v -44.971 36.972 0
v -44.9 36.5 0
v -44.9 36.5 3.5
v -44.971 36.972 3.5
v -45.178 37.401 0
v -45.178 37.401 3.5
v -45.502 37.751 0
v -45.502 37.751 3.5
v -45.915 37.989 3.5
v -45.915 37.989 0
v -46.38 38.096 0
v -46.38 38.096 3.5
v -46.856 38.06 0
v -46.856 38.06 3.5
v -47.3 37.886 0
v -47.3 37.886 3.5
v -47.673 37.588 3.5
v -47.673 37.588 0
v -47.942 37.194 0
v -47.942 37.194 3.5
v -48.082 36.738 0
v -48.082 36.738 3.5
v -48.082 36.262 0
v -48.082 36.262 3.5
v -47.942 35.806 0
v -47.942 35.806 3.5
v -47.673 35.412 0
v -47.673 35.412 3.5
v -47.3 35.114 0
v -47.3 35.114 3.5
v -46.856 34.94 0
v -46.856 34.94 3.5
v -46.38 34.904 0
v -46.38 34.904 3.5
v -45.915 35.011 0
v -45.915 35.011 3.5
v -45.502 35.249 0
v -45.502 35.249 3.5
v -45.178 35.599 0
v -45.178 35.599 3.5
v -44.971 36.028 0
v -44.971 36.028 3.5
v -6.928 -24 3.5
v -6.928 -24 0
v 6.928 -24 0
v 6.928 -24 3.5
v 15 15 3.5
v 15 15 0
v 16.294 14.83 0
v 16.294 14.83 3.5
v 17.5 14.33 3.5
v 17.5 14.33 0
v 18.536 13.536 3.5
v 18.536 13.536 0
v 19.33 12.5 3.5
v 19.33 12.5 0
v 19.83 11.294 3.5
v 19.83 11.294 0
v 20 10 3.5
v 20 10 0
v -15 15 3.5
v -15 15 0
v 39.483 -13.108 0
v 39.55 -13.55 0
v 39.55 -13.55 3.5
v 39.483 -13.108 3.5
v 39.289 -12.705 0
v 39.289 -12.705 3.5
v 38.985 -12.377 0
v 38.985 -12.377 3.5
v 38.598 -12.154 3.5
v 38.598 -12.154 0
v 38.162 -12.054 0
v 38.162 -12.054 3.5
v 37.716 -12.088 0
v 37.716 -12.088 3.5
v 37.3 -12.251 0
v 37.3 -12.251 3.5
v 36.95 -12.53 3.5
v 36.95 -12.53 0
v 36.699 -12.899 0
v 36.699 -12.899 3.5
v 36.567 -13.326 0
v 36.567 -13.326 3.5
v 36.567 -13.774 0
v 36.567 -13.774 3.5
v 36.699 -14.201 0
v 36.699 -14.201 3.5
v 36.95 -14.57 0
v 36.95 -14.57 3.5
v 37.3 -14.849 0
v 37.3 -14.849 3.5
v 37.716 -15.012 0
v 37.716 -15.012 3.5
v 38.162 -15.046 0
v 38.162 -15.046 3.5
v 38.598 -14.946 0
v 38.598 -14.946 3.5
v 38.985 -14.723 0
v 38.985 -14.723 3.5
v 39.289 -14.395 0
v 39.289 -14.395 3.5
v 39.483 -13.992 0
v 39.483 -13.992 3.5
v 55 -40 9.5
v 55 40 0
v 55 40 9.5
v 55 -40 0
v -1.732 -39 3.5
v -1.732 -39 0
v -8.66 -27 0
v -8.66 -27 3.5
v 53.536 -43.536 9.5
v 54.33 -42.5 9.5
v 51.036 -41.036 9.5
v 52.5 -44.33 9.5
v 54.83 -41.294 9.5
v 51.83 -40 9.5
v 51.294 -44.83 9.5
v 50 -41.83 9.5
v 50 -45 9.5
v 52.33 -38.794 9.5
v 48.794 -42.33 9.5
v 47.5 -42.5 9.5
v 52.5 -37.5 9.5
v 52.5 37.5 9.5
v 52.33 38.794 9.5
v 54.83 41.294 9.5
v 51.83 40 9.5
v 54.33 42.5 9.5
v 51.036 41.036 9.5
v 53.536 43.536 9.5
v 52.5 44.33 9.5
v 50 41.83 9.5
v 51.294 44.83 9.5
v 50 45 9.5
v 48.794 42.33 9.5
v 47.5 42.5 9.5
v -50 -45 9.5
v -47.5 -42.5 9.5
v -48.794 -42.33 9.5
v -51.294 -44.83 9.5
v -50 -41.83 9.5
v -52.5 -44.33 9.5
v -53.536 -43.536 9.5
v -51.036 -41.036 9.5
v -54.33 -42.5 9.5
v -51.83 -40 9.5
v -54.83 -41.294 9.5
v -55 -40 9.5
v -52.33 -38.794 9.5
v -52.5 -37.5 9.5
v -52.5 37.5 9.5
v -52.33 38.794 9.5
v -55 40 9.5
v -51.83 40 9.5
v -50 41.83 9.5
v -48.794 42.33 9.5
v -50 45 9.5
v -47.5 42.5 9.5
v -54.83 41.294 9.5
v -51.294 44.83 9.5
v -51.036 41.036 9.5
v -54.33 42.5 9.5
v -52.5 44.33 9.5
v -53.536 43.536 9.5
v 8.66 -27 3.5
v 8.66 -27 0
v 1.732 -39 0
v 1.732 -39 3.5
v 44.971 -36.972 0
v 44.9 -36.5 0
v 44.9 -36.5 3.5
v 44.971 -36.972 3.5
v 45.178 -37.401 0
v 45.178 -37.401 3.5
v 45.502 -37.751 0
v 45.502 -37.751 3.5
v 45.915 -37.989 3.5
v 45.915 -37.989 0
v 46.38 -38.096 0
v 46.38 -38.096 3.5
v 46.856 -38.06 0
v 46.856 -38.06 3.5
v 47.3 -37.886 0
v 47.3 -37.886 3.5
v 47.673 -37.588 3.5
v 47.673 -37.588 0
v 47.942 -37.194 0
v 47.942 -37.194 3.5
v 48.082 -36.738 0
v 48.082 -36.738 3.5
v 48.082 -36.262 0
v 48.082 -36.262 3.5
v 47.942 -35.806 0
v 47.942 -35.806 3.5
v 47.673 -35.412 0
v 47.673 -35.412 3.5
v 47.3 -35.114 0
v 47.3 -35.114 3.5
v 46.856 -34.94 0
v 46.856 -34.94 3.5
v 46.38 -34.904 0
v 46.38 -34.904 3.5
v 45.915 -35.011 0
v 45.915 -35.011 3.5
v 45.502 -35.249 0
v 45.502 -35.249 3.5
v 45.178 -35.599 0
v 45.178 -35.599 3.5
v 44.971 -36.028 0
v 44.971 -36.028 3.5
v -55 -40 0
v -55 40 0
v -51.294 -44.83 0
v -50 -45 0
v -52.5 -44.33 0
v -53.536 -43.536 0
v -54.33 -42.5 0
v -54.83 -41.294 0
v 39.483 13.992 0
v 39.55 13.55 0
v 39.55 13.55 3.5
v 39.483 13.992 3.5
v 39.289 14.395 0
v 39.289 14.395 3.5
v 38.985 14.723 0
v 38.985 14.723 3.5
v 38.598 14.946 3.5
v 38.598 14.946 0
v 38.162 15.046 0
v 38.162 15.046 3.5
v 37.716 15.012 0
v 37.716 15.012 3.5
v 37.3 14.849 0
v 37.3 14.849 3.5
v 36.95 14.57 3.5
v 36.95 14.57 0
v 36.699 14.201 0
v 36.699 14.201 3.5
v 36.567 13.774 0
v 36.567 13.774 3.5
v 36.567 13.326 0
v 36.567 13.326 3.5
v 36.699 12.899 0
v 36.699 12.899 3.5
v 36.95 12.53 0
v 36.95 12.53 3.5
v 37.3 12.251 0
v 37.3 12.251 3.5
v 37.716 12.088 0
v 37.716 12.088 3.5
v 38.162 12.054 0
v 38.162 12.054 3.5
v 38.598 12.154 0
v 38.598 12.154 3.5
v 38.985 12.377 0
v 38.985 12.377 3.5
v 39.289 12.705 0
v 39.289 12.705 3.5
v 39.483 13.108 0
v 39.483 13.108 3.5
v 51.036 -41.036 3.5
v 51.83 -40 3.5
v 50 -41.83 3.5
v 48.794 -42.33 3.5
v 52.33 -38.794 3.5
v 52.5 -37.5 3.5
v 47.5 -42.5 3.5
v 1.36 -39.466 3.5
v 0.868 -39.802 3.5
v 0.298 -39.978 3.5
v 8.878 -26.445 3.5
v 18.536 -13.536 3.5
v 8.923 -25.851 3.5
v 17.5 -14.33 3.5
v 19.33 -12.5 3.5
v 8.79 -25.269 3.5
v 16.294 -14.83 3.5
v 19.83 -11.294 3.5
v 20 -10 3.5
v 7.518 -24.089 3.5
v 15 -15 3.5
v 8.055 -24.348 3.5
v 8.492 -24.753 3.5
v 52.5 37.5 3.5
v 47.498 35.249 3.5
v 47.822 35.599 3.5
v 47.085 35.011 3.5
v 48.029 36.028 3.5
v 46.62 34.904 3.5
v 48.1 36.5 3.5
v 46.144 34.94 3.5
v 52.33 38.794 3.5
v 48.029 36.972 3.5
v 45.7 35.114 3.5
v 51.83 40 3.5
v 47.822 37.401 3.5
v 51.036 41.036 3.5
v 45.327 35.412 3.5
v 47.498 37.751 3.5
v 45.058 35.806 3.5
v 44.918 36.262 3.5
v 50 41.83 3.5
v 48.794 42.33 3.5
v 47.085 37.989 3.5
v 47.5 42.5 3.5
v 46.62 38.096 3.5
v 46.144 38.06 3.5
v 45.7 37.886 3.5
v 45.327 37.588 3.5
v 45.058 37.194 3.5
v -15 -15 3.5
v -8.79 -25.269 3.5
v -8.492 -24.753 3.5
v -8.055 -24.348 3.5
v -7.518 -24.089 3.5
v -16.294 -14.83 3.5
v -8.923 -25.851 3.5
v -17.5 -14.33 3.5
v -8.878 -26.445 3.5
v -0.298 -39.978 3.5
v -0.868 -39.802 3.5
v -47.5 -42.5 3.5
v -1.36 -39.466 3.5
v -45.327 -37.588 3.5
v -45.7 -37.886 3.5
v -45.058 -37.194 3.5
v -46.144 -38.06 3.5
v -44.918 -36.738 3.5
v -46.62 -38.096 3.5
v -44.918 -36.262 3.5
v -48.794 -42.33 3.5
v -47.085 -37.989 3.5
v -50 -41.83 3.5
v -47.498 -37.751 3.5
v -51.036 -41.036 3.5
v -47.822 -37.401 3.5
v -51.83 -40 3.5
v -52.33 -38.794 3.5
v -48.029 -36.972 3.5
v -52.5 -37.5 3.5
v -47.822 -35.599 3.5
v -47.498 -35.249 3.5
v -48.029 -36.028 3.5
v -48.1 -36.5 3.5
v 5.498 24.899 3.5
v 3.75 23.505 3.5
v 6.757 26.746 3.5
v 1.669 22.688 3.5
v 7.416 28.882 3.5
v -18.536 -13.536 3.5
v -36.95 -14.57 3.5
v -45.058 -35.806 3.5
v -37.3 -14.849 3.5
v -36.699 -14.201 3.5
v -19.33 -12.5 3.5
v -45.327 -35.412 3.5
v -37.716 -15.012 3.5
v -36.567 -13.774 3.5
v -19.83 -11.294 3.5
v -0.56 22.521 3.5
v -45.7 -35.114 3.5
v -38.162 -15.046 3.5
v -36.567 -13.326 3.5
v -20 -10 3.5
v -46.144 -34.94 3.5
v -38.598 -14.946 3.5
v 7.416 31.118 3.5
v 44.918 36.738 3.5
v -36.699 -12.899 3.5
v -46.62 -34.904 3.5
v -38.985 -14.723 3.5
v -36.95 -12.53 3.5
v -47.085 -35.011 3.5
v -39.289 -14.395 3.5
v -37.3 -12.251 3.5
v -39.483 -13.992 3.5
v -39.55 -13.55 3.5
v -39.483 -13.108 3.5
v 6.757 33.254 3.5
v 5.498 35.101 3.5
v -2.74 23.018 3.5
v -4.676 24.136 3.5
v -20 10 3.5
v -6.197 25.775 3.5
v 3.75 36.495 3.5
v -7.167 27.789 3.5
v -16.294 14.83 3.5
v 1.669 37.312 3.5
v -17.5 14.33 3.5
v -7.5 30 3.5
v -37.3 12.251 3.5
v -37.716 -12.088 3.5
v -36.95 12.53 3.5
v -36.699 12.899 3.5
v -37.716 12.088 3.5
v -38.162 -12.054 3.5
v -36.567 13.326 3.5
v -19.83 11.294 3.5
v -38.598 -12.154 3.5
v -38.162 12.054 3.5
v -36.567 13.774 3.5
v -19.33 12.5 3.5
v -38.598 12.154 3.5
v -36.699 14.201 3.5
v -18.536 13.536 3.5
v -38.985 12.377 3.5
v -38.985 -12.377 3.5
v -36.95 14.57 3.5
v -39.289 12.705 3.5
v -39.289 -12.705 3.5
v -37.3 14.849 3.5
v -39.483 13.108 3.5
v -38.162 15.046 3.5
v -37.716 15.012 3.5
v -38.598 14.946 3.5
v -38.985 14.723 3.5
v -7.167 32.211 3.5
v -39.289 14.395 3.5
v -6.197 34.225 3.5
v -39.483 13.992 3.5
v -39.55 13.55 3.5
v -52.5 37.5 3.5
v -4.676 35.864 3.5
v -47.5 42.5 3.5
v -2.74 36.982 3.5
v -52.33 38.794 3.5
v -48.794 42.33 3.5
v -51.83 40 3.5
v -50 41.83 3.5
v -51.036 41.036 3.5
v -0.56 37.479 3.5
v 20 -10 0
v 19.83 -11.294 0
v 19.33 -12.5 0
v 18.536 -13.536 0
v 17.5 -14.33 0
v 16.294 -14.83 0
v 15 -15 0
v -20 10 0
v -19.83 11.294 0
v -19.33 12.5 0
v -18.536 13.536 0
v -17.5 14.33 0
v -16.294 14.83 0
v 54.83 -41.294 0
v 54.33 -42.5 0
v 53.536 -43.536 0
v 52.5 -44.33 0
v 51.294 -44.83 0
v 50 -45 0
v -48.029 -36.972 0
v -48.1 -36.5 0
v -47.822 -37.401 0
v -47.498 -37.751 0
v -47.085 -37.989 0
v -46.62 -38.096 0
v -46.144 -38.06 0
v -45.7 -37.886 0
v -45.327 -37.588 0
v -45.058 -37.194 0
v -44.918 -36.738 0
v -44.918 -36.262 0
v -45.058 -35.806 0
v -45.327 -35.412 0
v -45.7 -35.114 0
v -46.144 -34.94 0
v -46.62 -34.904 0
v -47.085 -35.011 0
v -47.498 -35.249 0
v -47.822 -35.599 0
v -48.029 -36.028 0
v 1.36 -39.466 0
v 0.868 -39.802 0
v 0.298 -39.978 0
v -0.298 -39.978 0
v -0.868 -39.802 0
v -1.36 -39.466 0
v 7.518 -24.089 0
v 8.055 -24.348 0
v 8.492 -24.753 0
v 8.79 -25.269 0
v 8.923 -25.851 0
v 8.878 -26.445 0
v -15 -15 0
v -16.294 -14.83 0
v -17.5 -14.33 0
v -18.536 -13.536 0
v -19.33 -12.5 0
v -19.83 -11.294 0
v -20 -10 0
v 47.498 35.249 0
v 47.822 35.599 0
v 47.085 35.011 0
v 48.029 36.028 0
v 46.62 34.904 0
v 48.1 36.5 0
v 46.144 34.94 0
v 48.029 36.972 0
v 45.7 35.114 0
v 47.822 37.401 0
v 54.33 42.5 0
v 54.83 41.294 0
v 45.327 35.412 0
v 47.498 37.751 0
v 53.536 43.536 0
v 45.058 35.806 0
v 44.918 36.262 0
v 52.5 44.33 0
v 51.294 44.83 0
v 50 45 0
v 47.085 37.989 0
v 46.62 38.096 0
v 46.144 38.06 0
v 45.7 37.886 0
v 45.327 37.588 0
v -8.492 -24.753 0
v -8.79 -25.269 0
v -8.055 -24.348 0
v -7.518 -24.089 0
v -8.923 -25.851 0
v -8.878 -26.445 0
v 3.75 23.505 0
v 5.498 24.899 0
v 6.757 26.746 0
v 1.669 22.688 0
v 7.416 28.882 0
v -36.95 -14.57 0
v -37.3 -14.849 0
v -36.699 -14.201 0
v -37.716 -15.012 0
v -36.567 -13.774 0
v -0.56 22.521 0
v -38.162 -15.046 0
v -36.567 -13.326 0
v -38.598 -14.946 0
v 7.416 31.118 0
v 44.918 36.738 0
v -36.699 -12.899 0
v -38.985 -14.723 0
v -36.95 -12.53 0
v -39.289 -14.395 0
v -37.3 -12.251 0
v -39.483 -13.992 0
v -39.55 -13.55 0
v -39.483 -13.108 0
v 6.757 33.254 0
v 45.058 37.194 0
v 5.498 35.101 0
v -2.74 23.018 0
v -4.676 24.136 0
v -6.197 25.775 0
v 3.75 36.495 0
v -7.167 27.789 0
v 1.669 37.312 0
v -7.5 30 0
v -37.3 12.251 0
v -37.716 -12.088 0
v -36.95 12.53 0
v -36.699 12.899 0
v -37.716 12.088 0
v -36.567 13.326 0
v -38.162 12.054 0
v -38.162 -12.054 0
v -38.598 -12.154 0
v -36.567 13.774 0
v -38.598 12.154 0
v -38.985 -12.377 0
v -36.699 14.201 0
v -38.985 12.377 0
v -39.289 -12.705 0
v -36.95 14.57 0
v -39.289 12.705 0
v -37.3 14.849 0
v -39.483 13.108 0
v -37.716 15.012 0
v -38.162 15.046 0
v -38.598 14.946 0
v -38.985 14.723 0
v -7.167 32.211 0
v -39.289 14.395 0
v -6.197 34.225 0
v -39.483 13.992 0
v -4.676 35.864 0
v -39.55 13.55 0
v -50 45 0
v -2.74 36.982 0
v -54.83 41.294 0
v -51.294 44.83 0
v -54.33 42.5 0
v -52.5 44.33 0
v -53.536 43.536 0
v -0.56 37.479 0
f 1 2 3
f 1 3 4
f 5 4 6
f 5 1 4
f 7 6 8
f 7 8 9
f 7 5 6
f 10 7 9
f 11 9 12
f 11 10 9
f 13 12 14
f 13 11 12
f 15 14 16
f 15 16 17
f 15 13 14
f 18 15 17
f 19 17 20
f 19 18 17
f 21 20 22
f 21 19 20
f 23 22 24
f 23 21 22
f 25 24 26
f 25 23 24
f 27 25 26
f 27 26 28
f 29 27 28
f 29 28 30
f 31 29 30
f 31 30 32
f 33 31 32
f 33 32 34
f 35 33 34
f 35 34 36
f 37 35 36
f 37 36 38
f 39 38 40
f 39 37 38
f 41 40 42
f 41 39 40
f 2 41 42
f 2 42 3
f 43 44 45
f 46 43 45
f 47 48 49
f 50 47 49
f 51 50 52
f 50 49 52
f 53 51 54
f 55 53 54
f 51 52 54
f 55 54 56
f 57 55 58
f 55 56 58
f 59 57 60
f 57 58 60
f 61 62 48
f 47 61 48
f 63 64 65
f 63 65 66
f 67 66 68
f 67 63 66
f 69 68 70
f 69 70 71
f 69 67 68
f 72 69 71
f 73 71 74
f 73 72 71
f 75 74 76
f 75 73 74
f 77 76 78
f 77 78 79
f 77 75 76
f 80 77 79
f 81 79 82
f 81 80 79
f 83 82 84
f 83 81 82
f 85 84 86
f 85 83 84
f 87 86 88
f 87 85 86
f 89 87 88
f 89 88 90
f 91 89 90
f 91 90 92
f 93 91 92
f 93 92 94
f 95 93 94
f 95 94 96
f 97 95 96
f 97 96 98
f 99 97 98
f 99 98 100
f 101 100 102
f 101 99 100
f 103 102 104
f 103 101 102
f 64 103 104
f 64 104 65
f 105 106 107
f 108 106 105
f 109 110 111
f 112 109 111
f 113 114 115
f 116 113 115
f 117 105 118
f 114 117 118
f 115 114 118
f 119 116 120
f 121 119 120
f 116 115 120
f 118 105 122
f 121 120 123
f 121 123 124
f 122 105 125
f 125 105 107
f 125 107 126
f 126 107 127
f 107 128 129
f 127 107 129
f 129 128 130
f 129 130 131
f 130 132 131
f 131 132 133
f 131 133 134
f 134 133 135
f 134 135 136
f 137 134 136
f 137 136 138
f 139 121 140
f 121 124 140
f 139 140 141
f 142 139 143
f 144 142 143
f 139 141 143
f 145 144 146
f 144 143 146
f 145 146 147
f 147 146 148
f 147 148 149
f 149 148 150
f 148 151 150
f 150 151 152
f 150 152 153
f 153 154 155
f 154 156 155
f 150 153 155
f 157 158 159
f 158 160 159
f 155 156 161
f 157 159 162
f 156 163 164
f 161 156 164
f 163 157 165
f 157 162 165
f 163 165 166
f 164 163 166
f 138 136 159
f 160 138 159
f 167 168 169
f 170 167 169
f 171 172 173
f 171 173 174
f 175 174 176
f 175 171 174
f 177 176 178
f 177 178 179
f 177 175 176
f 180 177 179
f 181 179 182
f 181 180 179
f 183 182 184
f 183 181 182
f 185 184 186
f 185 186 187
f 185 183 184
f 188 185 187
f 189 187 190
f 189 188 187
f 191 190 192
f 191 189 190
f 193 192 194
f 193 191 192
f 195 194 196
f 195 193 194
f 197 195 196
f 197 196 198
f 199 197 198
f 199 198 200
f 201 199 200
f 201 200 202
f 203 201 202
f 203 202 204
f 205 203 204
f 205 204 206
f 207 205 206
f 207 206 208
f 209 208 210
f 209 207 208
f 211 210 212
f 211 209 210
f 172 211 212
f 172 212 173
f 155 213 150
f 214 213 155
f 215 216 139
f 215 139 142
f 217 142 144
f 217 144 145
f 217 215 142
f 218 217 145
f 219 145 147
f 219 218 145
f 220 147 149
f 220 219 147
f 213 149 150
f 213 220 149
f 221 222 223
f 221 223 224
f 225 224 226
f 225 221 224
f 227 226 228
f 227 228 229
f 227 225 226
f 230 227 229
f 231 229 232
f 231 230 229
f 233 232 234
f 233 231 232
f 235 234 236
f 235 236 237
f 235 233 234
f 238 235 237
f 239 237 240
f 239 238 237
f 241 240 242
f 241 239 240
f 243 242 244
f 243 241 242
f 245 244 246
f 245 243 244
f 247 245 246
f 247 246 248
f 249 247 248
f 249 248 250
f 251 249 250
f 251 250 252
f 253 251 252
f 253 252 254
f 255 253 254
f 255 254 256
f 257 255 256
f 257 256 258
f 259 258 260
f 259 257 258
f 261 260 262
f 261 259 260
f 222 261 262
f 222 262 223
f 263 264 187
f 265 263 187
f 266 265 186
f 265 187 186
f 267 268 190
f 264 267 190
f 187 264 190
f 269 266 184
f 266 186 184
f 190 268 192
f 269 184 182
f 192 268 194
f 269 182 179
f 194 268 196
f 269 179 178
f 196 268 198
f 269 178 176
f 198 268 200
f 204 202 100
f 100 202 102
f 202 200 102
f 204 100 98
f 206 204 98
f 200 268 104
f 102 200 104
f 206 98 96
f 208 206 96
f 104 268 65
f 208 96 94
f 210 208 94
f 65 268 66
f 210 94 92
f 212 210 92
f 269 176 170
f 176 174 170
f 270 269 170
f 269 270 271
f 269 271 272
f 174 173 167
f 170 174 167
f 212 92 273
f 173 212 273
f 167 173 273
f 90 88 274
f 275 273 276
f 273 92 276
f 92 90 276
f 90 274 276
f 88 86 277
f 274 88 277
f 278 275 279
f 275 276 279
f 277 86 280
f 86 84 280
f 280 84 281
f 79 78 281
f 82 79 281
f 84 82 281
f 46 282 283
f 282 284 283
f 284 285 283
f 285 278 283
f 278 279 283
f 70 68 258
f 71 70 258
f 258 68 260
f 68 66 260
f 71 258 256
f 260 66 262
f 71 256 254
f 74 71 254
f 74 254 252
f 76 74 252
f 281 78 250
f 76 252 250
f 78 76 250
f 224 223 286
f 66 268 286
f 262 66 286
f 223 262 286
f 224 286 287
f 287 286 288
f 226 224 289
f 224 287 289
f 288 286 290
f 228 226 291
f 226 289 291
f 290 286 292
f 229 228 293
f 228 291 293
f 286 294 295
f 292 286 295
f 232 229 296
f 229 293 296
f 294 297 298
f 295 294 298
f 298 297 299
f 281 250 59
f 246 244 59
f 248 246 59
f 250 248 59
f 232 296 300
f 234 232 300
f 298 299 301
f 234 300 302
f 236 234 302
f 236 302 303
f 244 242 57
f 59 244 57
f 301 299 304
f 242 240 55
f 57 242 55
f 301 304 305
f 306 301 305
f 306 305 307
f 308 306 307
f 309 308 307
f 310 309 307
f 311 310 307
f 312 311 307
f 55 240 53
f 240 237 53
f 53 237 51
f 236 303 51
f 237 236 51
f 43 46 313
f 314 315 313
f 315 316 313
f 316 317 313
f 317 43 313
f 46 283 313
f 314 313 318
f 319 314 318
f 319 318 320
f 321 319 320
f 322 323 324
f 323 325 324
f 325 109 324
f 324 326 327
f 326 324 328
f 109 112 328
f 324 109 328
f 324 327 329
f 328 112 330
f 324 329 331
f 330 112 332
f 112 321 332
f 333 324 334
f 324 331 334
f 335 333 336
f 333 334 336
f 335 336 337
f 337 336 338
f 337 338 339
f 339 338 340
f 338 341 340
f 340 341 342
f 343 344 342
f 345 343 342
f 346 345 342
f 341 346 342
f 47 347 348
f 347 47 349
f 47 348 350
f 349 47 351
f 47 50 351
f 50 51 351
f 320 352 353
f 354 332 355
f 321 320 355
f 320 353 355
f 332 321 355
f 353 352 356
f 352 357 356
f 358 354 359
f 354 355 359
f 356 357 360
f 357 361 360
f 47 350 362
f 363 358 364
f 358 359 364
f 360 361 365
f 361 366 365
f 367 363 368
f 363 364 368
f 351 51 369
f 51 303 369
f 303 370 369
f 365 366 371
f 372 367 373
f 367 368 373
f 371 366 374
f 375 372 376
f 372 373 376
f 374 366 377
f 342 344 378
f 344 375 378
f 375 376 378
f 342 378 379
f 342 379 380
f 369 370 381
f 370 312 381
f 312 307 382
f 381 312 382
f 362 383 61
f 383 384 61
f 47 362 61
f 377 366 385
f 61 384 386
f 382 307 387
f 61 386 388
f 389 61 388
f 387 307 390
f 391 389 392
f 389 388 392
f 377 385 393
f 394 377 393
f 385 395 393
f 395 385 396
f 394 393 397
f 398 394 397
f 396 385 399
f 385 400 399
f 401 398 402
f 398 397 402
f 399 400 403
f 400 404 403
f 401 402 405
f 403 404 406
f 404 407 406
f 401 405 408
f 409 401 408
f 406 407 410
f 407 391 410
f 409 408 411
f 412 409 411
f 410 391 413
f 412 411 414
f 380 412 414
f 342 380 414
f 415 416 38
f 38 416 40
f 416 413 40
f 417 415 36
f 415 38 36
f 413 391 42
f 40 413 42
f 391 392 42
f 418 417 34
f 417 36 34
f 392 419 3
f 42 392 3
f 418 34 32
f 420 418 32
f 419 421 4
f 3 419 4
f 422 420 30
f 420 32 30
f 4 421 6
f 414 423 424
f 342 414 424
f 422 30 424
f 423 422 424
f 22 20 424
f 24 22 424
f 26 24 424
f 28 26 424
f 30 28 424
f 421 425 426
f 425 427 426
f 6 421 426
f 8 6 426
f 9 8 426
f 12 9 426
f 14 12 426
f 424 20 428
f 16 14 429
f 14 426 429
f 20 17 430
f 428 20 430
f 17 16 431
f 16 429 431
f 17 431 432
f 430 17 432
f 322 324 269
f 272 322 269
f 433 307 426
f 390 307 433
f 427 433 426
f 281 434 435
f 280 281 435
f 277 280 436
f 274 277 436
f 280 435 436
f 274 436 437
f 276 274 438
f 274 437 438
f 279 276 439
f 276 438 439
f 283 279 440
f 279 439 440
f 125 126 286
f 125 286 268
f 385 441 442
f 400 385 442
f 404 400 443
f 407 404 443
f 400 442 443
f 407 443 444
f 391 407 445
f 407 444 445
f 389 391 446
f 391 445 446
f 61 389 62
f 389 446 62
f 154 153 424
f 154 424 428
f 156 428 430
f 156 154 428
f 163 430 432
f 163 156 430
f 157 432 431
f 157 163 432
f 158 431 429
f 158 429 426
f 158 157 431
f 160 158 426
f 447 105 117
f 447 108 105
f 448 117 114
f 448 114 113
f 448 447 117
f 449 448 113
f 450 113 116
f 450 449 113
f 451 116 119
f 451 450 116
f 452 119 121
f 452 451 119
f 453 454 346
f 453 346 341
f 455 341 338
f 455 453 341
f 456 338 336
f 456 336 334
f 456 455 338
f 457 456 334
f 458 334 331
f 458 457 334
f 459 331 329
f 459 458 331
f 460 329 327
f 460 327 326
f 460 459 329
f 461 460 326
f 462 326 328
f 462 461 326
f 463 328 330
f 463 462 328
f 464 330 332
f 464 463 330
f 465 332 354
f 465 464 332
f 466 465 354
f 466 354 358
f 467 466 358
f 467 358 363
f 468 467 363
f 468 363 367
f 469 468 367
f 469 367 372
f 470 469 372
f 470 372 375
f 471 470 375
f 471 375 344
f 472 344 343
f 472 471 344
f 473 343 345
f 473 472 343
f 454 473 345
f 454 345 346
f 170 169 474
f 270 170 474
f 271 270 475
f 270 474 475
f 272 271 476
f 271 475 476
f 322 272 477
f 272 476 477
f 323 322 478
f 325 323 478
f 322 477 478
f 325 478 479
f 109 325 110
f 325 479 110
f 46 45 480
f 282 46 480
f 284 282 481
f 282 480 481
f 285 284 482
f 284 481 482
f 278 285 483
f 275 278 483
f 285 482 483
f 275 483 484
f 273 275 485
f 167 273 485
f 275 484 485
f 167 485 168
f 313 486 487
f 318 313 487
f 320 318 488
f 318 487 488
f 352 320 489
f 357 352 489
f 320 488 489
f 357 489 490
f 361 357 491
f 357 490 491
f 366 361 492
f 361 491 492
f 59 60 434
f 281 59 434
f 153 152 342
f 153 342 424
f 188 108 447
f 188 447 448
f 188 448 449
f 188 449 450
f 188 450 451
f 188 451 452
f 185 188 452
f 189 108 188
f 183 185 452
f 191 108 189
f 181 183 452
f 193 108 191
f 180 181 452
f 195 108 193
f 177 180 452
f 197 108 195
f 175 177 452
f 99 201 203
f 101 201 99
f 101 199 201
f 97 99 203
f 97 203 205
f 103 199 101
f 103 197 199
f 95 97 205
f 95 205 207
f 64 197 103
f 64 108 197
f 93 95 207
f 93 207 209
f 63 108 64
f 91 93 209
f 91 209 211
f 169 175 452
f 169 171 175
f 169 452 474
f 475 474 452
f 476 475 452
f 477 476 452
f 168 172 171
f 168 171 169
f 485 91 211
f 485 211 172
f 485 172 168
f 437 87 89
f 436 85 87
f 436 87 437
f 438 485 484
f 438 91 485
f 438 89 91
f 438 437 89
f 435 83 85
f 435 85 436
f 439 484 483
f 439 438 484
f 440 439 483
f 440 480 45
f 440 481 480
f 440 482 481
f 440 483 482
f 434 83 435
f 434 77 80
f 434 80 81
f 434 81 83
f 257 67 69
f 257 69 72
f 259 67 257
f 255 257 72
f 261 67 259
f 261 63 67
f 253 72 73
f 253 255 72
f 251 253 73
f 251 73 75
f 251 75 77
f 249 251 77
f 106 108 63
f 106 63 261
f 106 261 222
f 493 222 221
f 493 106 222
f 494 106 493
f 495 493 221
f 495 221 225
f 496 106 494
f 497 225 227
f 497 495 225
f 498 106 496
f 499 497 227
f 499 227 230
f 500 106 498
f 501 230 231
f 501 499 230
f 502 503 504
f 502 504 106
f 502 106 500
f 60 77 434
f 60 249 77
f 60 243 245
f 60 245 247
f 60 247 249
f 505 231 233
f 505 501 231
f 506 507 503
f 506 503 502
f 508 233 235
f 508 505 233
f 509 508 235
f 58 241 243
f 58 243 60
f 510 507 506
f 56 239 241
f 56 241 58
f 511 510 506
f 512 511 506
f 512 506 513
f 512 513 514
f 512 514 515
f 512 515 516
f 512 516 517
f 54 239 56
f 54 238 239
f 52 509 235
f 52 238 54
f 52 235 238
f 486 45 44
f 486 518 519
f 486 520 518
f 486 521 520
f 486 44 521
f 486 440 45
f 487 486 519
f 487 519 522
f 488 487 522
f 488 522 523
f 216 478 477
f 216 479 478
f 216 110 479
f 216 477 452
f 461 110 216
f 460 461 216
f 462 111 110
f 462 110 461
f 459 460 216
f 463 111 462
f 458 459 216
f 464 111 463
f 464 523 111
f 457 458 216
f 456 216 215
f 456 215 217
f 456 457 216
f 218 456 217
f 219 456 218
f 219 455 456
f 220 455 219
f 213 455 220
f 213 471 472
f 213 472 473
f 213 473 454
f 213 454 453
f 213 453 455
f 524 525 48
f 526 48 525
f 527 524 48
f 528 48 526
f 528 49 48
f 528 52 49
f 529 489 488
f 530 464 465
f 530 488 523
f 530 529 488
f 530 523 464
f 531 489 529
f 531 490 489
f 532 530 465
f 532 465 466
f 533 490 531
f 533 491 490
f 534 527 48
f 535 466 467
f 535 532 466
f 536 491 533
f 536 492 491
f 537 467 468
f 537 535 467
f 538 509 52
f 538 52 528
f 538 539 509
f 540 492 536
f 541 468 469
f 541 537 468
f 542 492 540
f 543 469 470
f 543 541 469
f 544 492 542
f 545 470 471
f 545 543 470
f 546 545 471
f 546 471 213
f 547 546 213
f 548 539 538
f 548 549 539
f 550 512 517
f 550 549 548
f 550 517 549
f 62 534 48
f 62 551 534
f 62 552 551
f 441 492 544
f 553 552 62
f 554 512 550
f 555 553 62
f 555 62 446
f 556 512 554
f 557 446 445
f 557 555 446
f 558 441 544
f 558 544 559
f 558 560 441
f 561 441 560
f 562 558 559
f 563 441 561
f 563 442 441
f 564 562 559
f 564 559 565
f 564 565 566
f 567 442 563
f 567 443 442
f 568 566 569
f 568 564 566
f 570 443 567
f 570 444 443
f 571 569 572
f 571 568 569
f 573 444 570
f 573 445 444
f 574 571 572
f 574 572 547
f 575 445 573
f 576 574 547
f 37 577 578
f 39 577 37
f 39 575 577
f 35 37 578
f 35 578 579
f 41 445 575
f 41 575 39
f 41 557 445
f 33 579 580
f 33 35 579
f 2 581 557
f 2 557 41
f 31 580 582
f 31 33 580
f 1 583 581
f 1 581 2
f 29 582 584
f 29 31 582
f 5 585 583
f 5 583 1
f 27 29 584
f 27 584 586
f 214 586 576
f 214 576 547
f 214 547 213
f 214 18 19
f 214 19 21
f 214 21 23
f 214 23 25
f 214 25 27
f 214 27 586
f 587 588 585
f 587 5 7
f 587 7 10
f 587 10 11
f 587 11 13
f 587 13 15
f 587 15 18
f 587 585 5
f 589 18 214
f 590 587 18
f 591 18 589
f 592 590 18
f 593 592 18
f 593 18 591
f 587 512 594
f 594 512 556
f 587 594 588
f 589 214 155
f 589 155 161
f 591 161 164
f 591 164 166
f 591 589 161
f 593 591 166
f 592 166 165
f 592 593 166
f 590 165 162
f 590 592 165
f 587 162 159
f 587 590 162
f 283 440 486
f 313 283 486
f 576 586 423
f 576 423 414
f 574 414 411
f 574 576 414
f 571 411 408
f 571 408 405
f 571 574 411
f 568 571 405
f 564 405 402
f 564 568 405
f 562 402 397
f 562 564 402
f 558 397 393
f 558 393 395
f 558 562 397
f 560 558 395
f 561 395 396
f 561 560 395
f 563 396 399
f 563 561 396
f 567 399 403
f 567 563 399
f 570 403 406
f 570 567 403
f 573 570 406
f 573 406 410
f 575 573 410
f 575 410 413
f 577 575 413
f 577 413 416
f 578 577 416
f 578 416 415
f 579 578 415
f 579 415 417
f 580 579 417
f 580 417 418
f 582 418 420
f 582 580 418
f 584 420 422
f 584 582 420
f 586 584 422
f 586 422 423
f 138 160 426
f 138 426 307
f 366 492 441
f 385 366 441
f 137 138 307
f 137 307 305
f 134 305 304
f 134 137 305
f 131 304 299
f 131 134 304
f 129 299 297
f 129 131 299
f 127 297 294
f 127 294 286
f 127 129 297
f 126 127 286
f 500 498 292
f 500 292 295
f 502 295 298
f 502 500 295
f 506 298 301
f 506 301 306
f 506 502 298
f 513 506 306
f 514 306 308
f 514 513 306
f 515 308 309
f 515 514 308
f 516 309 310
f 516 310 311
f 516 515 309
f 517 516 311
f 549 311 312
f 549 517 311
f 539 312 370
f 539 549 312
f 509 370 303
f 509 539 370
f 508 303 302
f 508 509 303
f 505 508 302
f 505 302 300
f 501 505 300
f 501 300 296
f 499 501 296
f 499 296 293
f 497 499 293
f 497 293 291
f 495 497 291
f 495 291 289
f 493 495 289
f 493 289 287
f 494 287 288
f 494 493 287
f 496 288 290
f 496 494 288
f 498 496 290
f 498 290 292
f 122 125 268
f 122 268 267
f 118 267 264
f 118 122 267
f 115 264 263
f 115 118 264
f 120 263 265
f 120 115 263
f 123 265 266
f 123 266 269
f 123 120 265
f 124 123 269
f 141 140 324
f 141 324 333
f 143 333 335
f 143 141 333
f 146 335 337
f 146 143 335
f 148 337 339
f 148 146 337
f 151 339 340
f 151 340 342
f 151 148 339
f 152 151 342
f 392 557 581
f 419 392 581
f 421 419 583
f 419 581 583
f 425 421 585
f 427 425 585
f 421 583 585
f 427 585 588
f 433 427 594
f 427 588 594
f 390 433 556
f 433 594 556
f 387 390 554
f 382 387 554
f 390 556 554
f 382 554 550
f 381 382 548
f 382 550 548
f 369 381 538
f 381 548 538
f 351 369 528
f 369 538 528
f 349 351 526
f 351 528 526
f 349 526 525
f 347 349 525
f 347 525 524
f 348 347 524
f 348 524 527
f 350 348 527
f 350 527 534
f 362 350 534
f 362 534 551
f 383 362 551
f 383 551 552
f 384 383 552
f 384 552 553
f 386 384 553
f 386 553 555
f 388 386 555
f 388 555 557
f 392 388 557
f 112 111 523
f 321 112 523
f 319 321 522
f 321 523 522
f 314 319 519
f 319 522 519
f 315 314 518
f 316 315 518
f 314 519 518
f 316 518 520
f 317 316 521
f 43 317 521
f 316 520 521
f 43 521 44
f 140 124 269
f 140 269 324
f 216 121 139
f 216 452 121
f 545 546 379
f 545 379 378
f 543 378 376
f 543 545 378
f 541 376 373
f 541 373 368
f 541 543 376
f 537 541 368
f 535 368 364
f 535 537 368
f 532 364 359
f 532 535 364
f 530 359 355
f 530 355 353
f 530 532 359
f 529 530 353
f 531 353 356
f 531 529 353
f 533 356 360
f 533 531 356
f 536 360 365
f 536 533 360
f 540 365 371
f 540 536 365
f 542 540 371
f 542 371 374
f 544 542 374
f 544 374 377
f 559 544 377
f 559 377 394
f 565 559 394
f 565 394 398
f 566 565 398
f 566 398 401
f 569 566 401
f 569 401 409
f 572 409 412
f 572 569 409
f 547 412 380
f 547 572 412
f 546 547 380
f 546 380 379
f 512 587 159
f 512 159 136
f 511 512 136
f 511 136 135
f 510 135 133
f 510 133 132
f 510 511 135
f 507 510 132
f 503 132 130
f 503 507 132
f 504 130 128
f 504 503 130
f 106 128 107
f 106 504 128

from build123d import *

# Parameters (mm, degrees)
SKETCH1_R           = 1.6
SKETCH1_R_2         = 1.5
BOSS_EXTRUDE1_DEPTH = 3.5
SKETCH2_R           = 7.5
CUT_EXTRUDE1_DEPTH  = 10
BOSS_EXTRUDE2_DEPTH = 6
CUT_EXTRUDE2_DEPTH  = 6


with BuildPart() as part:
    # Sketch1 → Boss-Extrude1 (new body)
    with BuildSketch(Plane.XY):
        with BuildLine():
            Line((50, -45), (-50, -45))
            ThreePointArc((-50, -45), (-53.535533906, -43.535533906), (-55, -40))
            Line((-55, -40), (-55, 40))
            ThreePointArc((-55, 40), (-53.535533906, 43.535533906), (-50, 45))
            Line((-50, 45), (50, 45))
            ThreePointArc((50, 45), (53.535533906, 43.535533906), (55, 40))
            Line((55, 40), (55, -40))
            ThreePointArc((55, -40), (53.535533906, -43.535533906), (50, -45))
        make_face()
        with Locations((-46.5, 36.5)):
            Circle(SKETCH1_R, mode=Mode.SUBTRACT)
        with Locations((46.5, 36.5)):
            Circle(SKETCH1_R, mode=Mode.SUBTRACT)
        with Locations(Location((46.5, -36.5, 0), (0, 0, 180))):
            Circle(SKETCH1_R, mode=Mode.SUBTRACT)
        with Locations(Location((-46.5, -36.5, 0), (0, 0, 180))):
            Circle(SKETCH1_R, mode=Mode.SUBTRACT)
        with Locations((38.05, 13.55)):
            Circle(SKETCH1_R_2, mode=Mode.SUBTRACT)
        with Locations((38.05, -13.55)):
            Circle(SKETCH1_R_2, mode=Mode.SUBTRACT)
        with Locations(Location((-38.05, -13.55, 0), (0, 0, 180))):
            Circle(SKETCH1_R_2, mode=Mode.SUBTRACT)
        with Locations(Location((-38.05, 13.55, 0), (0, 0, 180))):
            Circle(SKETCH1_R_2, mode=Mode.SUBTRACT)
    extrude(amount=BOSS_EXTRUDE1_DEPTH)

    # Sketch2 → Cut-Extrude1 (cut)
    with BuildSketch(Plane(origin=(0, 0, 0), x_dir=(-1, 0, 0), z_dir=(0, 0, -1))):
        with Locations((0, 30)):
            Circle(SKETCH2_R)
        with BuildLine():
            Line((-15, -15), (15, -15))
            ThreePointArc((15, -15), (18.535533906, -13.535533906), (20, -10))
            Line((20, -10), (20, 10))
            ThreePointArc((20, 10), (18.535533906, 13.535533906), (15, 15))
            Line((15, 15), (-15, 15))
            ThreePointArc((-15, 15), (-18.535533906, 13.535533906), (-20, 10))
            Line((-20, 10), (-20, -10))
            ThreePointArc((-20, -10), (-18.535533906, -13.535533906), (-15, -15))
        make_face()
        with BuildLine():
            Line((1.732050808, -39), (8.660254038, -27))
            ThreePointArc((8.660254038, -27), (8.660254038, -25), (6.92820323, -24))
            Line((6.92820323, -24), (-6.92820323, -24))
            ThreePointArc((-6.92820323, -24), (-8.660254038, -25), (-8.660254038, -27))
            Line((-8.660254038, -27), (-1.732050808, -39))
            ThreePointArc((-1.732050808, -39), (0, -40), (1.732050808, -39))
        make_face()
    extrude(amount=-CUT_EXTRUDE1_DEPTH, mode=Mode.SUBTRACT)

    # Sketch3 → Boss-Extrude2 (add)
    with BuildSketch(Plane.XY.offset(3.5)):
        with BuildLine():
            Line((50, -45), (-50, -45))
            ThreePointArc((-50, -45), (-53.535533906, -43.535533906), (-55, -40))
            Line((-55, -40), (-55, 40))
            ThreePointArc((-55, 40), (-53.535533906, 43.535533906), (-50, 45))
            Line((-50, 45), (50, 45))
            ThreePointArc((50, 45), (53.535533906, 43.535533906), (55, 40))
            Line((55, 40), (55, -40))
            ThreePointArc((55, -40), (53.535533906, -43.535533906), (50, -45))
        make_face()
    extrude(amount=BOSS_EXTRUDE2_DEPTH)

    # Sketch4 → Cut-Extrude2 (cut)
    with BuildSketch(Plane.XY.offset(9.5)):
        with BuildLine():
            Line((47.5, -42.5), (-47.5, -42.5))
            ThreePointArc((-47.5, -42.5), (-51.035533906, -41.035533906), (-52.5, -37.5))
            Line((-52.5, -37.5), (-52.5, 37.5))
            ThreePointArc((-52.5, 37.5), (-51.035533906, 41.035533906), (-47.5, 42.5))
            Line((-47.5, 42.5), (47.5, 42.5))
            ThreePointArc((47.5, 42.5), (51.035533906, 41.035533906), (52.5, 37.5))
            Line((52.5, 37.5), (52.5, -37.5))
            ThreePointArc((52.5, -37.5), (51.035533906, -41.035533906), (47.5, -42.5))
        make_face()
    extrude(amount=-CUT_EXTRUDE2_DEPTH, mode=Mode.SUBTRACT)


solid = part.part
